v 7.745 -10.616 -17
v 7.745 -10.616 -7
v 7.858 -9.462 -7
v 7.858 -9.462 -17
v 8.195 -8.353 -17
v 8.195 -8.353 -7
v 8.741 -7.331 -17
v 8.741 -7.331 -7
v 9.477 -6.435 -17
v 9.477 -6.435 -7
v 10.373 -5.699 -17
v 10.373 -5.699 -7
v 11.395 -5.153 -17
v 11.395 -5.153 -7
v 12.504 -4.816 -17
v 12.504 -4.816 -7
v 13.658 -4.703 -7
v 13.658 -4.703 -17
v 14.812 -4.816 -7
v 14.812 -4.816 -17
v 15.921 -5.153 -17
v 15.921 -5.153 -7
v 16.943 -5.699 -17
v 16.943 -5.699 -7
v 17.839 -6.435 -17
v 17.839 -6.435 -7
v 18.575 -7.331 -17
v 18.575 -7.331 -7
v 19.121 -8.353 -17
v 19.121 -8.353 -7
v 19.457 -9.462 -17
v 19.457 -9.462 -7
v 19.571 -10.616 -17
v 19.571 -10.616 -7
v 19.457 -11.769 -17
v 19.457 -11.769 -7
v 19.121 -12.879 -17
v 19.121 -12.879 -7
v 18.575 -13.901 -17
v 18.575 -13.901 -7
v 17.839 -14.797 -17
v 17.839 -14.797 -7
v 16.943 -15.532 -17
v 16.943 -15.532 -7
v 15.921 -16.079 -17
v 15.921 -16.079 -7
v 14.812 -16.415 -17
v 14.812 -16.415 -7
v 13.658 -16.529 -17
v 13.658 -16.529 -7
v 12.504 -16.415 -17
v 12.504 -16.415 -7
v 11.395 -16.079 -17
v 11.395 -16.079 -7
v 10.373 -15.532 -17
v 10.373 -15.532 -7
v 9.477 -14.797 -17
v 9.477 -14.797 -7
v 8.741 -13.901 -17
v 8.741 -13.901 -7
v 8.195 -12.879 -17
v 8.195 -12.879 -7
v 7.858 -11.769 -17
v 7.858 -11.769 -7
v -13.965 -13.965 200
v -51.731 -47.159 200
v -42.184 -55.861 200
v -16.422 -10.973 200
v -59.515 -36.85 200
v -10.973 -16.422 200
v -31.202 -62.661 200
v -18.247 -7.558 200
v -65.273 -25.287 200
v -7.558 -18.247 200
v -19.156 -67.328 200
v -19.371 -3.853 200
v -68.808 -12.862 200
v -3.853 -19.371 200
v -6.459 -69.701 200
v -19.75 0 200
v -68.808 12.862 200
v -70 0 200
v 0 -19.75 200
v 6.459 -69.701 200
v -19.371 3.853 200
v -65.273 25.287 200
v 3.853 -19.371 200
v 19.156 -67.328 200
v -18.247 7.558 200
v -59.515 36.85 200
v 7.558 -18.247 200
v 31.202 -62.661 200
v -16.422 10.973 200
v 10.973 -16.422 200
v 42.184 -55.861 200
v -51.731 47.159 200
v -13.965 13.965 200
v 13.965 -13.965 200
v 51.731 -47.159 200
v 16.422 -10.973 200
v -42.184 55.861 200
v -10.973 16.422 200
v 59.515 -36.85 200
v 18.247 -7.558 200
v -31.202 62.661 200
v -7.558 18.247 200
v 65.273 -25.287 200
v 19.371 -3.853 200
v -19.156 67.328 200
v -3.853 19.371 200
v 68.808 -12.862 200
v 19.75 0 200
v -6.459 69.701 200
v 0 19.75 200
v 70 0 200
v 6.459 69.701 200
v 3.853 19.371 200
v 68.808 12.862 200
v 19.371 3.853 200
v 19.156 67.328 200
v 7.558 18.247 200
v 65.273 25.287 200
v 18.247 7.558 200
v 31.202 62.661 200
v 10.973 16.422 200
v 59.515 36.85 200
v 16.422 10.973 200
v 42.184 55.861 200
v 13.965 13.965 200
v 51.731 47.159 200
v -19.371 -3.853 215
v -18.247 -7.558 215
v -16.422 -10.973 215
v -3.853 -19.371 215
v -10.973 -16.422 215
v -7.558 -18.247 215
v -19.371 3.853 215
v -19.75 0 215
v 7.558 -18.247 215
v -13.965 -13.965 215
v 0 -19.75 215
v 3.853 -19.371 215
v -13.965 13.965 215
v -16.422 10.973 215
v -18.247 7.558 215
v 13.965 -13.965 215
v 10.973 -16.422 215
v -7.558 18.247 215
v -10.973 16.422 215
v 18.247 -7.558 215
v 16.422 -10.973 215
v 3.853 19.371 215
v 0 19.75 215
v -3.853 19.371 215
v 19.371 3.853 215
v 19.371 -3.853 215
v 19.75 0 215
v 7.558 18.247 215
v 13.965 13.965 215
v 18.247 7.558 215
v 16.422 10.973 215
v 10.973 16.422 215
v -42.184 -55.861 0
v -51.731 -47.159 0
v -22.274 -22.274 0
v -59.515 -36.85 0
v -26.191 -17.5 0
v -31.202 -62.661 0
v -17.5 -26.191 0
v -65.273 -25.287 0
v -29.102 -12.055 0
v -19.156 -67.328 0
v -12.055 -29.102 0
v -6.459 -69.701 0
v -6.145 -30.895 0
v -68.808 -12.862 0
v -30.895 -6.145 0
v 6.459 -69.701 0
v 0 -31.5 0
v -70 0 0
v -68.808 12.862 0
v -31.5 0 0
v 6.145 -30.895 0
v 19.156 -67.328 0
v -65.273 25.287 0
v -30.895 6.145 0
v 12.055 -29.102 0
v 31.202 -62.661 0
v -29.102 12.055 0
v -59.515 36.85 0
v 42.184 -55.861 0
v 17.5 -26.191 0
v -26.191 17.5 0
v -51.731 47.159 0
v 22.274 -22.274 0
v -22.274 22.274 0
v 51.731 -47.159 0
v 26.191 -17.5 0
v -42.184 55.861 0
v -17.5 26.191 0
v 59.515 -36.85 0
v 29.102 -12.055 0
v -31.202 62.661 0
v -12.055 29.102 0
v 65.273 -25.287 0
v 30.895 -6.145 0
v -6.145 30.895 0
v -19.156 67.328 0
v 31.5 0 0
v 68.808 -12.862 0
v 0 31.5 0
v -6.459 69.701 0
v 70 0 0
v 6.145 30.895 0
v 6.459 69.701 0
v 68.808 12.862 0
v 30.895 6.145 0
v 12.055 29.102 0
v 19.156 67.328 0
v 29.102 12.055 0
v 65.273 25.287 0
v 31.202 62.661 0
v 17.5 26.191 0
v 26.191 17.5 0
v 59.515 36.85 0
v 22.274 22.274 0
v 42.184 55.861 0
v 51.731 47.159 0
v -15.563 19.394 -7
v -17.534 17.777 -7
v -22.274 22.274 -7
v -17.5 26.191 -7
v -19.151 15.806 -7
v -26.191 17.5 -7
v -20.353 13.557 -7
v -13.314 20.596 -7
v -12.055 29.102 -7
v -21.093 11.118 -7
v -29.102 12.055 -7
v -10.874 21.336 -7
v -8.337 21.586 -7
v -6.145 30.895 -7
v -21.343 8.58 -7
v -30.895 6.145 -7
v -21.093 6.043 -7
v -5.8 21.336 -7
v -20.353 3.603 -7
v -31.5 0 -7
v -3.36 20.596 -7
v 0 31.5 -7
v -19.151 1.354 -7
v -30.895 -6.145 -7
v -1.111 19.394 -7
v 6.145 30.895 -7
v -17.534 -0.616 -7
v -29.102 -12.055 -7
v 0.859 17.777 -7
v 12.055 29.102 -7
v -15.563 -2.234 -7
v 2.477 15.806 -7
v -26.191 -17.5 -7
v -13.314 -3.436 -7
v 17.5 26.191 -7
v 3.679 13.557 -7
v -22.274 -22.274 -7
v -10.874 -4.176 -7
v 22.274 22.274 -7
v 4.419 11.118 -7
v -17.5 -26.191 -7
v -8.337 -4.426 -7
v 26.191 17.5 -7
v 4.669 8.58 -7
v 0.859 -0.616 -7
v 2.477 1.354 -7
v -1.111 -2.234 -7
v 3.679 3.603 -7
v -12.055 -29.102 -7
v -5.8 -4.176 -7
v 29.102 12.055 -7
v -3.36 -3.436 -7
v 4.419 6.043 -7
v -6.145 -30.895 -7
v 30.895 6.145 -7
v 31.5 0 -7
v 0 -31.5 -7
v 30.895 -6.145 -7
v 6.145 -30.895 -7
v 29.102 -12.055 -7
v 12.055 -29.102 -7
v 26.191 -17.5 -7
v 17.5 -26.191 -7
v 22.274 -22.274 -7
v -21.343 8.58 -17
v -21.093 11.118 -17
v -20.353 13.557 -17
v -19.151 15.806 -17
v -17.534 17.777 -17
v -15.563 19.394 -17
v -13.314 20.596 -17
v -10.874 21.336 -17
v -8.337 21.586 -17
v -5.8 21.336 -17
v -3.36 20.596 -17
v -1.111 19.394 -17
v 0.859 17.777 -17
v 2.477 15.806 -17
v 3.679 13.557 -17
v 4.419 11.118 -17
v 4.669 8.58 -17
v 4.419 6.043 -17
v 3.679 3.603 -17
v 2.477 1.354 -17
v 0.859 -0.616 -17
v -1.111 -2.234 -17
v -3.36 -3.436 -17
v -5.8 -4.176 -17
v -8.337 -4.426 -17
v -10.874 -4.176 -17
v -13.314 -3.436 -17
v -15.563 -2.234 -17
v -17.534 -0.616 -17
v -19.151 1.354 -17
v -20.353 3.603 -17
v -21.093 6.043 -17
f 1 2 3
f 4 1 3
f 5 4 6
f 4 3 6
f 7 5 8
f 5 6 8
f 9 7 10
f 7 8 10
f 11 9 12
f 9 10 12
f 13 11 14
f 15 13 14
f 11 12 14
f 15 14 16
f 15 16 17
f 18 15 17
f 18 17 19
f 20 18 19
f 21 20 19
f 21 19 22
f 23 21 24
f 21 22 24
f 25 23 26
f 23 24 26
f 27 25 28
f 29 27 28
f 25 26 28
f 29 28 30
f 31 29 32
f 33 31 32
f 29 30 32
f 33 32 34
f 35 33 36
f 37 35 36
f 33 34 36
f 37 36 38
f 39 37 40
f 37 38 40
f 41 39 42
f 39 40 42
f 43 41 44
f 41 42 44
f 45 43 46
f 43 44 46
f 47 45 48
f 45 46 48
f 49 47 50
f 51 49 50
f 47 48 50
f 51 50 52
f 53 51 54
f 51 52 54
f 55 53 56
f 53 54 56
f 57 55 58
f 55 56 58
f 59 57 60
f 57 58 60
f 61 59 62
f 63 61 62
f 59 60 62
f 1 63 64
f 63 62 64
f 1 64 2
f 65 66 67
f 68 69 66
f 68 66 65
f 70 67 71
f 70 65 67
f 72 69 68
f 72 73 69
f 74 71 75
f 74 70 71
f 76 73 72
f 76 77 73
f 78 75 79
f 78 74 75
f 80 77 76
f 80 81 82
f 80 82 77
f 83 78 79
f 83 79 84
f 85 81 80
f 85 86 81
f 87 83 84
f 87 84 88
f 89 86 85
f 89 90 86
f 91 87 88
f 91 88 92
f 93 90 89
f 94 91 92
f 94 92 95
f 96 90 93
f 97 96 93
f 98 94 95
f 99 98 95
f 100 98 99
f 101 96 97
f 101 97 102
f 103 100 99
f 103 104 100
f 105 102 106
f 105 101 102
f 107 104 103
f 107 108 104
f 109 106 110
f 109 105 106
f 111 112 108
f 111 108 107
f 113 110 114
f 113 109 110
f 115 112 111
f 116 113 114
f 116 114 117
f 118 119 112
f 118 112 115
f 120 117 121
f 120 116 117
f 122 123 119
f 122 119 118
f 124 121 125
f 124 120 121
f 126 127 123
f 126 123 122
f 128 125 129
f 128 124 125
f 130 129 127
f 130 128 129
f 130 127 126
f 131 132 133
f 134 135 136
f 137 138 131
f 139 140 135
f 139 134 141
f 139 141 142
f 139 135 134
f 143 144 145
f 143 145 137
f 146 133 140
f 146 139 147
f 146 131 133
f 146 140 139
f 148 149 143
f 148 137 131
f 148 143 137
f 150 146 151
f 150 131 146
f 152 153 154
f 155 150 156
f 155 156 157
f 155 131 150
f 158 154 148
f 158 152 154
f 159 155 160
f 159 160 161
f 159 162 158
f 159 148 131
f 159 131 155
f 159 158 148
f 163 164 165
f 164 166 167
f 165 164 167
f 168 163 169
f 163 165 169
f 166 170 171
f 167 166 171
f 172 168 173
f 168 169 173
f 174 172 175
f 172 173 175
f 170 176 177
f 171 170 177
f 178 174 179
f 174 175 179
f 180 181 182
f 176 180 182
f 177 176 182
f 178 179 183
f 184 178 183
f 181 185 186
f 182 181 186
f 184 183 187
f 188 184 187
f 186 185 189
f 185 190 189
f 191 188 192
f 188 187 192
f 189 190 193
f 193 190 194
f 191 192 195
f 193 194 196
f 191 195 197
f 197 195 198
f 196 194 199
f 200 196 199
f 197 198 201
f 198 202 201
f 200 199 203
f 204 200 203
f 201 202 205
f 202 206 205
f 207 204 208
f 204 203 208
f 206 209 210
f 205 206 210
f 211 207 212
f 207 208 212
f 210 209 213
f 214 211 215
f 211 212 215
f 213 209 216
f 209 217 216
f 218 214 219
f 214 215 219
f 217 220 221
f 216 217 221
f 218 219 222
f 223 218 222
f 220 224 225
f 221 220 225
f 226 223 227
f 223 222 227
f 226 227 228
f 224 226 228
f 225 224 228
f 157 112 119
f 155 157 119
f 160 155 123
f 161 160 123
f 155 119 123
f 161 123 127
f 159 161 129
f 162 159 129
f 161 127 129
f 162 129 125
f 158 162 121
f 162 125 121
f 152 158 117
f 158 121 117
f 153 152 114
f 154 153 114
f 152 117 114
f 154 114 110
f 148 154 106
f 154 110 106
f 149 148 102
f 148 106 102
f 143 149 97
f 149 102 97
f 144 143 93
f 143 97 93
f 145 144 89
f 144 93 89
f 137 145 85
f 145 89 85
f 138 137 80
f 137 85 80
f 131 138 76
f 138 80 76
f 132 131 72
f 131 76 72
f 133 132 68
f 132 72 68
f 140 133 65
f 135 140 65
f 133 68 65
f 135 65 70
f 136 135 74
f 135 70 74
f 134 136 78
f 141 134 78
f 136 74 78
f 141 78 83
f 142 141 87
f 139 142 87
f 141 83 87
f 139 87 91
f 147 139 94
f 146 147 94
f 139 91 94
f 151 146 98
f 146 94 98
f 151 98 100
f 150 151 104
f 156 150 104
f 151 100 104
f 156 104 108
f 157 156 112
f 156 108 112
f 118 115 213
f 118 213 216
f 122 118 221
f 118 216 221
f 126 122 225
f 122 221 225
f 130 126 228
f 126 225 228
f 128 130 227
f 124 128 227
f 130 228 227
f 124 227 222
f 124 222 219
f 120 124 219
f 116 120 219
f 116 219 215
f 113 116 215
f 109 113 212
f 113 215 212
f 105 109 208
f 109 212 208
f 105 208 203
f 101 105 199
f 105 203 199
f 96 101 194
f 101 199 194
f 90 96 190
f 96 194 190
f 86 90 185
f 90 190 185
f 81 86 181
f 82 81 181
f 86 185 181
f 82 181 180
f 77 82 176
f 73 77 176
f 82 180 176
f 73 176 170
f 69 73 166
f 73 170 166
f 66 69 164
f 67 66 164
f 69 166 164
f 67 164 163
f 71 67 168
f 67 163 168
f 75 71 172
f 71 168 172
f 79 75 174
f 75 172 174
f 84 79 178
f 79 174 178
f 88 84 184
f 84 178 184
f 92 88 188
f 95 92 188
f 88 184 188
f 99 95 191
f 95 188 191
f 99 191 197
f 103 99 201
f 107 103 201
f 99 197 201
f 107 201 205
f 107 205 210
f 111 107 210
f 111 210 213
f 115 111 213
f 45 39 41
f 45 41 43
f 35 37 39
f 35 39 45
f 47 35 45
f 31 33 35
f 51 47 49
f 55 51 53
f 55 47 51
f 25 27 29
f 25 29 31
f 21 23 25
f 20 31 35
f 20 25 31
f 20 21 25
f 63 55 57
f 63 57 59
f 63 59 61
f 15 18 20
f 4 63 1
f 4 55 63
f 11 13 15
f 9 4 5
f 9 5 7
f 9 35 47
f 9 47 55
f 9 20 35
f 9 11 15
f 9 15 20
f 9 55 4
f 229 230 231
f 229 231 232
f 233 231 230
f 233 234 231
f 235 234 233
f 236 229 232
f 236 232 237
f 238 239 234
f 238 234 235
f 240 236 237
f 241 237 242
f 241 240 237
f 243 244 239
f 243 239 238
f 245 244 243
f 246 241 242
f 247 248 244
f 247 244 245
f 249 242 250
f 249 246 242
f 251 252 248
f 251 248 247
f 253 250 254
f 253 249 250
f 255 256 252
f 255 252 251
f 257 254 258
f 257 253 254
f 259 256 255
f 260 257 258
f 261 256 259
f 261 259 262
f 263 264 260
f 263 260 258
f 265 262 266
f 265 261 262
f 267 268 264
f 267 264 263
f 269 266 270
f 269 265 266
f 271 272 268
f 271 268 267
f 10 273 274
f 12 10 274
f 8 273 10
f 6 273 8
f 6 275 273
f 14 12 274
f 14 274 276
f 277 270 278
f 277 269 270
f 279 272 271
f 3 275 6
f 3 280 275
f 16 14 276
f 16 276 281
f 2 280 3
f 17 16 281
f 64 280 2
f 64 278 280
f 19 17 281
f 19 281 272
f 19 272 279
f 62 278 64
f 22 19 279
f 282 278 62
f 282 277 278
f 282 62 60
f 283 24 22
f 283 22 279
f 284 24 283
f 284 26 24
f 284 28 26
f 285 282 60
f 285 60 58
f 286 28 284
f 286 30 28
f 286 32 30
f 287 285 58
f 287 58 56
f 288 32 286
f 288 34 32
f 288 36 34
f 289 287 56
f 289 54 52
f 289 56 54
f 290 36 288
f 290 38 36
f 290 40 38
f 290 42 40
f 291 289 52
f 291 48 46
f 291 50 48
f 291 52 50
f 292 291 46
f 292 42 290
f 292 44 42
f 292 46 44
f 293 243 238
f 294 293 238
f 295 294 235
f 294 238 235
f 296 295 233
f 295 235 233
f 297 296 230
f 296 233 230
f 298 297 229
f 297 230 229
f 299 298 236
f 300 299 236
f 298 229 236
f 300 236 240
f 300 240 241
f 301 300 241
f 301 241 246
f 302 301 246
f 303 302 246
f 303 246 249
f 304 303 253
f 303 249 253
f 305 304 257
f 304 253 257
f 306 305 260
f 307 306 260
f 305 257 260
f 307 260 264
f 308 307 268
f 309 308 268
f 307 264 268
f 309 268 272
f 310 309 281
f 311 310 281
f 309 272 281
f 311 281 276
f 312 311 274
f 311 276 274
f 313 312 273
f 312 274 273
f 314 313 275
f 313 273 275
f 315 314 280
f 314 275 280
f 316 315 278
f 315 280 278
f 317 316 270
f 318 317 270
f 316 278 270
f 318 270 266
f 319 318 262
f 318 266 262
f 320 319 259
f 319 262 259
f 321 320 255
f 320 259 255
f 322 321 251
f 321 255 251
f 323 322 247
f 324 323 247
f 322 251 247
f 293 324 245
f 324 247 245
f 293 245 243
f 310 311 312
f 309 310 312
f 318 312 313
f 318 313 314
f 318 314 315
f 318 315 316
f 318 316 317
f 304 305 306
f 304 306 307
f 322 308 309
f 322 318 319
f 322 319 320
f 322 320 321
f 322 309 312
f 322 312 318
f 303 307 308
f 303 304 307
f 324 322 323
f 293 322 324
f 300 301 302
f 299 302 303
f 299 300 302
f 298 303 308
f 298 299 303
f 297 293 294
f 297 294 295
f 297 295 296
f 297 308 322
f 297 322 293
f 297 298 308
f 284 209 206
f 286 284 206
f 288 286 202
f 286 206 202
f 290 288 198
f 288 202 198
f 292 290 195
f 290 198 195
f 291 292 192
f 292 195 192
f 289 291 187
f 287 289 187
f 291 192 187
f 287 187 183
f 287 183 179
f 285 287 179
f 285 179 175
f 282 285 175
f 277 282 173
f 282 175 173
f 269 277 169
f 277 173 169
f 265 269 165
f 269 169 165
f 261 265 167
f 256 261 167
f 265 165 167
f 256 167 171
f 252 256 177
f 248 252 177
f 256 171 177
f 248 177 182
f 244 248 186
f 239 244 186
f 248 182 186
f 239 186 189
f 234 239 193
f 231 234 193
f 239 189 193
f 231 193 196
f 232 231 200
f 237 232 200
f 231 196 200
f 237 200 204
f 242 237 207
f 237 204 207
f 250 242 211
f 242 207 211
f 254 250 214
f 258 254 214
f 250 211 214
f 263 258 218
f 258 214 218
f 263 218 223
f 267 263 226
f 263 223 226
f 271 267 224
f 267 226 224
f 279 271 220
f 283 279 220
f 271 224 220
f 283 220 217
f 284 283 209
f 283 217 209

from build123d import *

# Parameters (mm, degrees)
SKETCH3_R           = 70
BOSS_EXTRUDE1_DEPTH = 200
SKETCH4_R           = 19.75
BOSS_EXTRUDE2_DEPTH = 15
SKETCH5_R           = 31.5
BOSS_EXTRUDE3_DEPTH = 7
SKETCH6_R           = 13.005945397
SKETCH6_R_2         = 5.913103463
BOSS_EXTRUDE4_DEPTH = 10


with BuildPart() as part:
    # Sketch3 → Boss-Extrude1 (new body)
    with BuildSketch(Plane.XY):
        Circle(SKETCH3_R)
    extrude(amount=BOSS_EXTRUDE1_DEPTH)

    # Sketch4 → Boss-Extrude2 (add)
    with BuildSketch(Plane.XY.offset(200)):
        Circle(SKETCH4_R)
    extrude(amount=BOSS_EXTRUDE2_DEPTH)

    # Sketch5 → Boss-Extrude3 (add)
    with BuildSketch(Plane(origin=(0, 0, 0), x_dir=(-1, 0, 0), z_dir=(0, 0, -1))):
        with Locations(Location((0, 0, 0), (0, 0, 180))):
            Circle(SKETCH5_R)
    extrude(amount=BOSS_EXTRUDE3_DEPTH)

    # Sketch6 → Boss-Extrude4 (add)
    with BuildSketch(Plane(origin=(0, 0, -7), x_dir=(-1, 0, 0), z_dir=(0, 0, -1))):
        with Locations((8.337101301, 8.580168456)):
            Circle(SKETCH6_R)
        with Locations((-13.657956127, -10.615712672)):
            Circle(SKETCH6_R_2)
    extrude(amount=BOSS_EXTRUDE4_DEPTH)


solid = part.part
